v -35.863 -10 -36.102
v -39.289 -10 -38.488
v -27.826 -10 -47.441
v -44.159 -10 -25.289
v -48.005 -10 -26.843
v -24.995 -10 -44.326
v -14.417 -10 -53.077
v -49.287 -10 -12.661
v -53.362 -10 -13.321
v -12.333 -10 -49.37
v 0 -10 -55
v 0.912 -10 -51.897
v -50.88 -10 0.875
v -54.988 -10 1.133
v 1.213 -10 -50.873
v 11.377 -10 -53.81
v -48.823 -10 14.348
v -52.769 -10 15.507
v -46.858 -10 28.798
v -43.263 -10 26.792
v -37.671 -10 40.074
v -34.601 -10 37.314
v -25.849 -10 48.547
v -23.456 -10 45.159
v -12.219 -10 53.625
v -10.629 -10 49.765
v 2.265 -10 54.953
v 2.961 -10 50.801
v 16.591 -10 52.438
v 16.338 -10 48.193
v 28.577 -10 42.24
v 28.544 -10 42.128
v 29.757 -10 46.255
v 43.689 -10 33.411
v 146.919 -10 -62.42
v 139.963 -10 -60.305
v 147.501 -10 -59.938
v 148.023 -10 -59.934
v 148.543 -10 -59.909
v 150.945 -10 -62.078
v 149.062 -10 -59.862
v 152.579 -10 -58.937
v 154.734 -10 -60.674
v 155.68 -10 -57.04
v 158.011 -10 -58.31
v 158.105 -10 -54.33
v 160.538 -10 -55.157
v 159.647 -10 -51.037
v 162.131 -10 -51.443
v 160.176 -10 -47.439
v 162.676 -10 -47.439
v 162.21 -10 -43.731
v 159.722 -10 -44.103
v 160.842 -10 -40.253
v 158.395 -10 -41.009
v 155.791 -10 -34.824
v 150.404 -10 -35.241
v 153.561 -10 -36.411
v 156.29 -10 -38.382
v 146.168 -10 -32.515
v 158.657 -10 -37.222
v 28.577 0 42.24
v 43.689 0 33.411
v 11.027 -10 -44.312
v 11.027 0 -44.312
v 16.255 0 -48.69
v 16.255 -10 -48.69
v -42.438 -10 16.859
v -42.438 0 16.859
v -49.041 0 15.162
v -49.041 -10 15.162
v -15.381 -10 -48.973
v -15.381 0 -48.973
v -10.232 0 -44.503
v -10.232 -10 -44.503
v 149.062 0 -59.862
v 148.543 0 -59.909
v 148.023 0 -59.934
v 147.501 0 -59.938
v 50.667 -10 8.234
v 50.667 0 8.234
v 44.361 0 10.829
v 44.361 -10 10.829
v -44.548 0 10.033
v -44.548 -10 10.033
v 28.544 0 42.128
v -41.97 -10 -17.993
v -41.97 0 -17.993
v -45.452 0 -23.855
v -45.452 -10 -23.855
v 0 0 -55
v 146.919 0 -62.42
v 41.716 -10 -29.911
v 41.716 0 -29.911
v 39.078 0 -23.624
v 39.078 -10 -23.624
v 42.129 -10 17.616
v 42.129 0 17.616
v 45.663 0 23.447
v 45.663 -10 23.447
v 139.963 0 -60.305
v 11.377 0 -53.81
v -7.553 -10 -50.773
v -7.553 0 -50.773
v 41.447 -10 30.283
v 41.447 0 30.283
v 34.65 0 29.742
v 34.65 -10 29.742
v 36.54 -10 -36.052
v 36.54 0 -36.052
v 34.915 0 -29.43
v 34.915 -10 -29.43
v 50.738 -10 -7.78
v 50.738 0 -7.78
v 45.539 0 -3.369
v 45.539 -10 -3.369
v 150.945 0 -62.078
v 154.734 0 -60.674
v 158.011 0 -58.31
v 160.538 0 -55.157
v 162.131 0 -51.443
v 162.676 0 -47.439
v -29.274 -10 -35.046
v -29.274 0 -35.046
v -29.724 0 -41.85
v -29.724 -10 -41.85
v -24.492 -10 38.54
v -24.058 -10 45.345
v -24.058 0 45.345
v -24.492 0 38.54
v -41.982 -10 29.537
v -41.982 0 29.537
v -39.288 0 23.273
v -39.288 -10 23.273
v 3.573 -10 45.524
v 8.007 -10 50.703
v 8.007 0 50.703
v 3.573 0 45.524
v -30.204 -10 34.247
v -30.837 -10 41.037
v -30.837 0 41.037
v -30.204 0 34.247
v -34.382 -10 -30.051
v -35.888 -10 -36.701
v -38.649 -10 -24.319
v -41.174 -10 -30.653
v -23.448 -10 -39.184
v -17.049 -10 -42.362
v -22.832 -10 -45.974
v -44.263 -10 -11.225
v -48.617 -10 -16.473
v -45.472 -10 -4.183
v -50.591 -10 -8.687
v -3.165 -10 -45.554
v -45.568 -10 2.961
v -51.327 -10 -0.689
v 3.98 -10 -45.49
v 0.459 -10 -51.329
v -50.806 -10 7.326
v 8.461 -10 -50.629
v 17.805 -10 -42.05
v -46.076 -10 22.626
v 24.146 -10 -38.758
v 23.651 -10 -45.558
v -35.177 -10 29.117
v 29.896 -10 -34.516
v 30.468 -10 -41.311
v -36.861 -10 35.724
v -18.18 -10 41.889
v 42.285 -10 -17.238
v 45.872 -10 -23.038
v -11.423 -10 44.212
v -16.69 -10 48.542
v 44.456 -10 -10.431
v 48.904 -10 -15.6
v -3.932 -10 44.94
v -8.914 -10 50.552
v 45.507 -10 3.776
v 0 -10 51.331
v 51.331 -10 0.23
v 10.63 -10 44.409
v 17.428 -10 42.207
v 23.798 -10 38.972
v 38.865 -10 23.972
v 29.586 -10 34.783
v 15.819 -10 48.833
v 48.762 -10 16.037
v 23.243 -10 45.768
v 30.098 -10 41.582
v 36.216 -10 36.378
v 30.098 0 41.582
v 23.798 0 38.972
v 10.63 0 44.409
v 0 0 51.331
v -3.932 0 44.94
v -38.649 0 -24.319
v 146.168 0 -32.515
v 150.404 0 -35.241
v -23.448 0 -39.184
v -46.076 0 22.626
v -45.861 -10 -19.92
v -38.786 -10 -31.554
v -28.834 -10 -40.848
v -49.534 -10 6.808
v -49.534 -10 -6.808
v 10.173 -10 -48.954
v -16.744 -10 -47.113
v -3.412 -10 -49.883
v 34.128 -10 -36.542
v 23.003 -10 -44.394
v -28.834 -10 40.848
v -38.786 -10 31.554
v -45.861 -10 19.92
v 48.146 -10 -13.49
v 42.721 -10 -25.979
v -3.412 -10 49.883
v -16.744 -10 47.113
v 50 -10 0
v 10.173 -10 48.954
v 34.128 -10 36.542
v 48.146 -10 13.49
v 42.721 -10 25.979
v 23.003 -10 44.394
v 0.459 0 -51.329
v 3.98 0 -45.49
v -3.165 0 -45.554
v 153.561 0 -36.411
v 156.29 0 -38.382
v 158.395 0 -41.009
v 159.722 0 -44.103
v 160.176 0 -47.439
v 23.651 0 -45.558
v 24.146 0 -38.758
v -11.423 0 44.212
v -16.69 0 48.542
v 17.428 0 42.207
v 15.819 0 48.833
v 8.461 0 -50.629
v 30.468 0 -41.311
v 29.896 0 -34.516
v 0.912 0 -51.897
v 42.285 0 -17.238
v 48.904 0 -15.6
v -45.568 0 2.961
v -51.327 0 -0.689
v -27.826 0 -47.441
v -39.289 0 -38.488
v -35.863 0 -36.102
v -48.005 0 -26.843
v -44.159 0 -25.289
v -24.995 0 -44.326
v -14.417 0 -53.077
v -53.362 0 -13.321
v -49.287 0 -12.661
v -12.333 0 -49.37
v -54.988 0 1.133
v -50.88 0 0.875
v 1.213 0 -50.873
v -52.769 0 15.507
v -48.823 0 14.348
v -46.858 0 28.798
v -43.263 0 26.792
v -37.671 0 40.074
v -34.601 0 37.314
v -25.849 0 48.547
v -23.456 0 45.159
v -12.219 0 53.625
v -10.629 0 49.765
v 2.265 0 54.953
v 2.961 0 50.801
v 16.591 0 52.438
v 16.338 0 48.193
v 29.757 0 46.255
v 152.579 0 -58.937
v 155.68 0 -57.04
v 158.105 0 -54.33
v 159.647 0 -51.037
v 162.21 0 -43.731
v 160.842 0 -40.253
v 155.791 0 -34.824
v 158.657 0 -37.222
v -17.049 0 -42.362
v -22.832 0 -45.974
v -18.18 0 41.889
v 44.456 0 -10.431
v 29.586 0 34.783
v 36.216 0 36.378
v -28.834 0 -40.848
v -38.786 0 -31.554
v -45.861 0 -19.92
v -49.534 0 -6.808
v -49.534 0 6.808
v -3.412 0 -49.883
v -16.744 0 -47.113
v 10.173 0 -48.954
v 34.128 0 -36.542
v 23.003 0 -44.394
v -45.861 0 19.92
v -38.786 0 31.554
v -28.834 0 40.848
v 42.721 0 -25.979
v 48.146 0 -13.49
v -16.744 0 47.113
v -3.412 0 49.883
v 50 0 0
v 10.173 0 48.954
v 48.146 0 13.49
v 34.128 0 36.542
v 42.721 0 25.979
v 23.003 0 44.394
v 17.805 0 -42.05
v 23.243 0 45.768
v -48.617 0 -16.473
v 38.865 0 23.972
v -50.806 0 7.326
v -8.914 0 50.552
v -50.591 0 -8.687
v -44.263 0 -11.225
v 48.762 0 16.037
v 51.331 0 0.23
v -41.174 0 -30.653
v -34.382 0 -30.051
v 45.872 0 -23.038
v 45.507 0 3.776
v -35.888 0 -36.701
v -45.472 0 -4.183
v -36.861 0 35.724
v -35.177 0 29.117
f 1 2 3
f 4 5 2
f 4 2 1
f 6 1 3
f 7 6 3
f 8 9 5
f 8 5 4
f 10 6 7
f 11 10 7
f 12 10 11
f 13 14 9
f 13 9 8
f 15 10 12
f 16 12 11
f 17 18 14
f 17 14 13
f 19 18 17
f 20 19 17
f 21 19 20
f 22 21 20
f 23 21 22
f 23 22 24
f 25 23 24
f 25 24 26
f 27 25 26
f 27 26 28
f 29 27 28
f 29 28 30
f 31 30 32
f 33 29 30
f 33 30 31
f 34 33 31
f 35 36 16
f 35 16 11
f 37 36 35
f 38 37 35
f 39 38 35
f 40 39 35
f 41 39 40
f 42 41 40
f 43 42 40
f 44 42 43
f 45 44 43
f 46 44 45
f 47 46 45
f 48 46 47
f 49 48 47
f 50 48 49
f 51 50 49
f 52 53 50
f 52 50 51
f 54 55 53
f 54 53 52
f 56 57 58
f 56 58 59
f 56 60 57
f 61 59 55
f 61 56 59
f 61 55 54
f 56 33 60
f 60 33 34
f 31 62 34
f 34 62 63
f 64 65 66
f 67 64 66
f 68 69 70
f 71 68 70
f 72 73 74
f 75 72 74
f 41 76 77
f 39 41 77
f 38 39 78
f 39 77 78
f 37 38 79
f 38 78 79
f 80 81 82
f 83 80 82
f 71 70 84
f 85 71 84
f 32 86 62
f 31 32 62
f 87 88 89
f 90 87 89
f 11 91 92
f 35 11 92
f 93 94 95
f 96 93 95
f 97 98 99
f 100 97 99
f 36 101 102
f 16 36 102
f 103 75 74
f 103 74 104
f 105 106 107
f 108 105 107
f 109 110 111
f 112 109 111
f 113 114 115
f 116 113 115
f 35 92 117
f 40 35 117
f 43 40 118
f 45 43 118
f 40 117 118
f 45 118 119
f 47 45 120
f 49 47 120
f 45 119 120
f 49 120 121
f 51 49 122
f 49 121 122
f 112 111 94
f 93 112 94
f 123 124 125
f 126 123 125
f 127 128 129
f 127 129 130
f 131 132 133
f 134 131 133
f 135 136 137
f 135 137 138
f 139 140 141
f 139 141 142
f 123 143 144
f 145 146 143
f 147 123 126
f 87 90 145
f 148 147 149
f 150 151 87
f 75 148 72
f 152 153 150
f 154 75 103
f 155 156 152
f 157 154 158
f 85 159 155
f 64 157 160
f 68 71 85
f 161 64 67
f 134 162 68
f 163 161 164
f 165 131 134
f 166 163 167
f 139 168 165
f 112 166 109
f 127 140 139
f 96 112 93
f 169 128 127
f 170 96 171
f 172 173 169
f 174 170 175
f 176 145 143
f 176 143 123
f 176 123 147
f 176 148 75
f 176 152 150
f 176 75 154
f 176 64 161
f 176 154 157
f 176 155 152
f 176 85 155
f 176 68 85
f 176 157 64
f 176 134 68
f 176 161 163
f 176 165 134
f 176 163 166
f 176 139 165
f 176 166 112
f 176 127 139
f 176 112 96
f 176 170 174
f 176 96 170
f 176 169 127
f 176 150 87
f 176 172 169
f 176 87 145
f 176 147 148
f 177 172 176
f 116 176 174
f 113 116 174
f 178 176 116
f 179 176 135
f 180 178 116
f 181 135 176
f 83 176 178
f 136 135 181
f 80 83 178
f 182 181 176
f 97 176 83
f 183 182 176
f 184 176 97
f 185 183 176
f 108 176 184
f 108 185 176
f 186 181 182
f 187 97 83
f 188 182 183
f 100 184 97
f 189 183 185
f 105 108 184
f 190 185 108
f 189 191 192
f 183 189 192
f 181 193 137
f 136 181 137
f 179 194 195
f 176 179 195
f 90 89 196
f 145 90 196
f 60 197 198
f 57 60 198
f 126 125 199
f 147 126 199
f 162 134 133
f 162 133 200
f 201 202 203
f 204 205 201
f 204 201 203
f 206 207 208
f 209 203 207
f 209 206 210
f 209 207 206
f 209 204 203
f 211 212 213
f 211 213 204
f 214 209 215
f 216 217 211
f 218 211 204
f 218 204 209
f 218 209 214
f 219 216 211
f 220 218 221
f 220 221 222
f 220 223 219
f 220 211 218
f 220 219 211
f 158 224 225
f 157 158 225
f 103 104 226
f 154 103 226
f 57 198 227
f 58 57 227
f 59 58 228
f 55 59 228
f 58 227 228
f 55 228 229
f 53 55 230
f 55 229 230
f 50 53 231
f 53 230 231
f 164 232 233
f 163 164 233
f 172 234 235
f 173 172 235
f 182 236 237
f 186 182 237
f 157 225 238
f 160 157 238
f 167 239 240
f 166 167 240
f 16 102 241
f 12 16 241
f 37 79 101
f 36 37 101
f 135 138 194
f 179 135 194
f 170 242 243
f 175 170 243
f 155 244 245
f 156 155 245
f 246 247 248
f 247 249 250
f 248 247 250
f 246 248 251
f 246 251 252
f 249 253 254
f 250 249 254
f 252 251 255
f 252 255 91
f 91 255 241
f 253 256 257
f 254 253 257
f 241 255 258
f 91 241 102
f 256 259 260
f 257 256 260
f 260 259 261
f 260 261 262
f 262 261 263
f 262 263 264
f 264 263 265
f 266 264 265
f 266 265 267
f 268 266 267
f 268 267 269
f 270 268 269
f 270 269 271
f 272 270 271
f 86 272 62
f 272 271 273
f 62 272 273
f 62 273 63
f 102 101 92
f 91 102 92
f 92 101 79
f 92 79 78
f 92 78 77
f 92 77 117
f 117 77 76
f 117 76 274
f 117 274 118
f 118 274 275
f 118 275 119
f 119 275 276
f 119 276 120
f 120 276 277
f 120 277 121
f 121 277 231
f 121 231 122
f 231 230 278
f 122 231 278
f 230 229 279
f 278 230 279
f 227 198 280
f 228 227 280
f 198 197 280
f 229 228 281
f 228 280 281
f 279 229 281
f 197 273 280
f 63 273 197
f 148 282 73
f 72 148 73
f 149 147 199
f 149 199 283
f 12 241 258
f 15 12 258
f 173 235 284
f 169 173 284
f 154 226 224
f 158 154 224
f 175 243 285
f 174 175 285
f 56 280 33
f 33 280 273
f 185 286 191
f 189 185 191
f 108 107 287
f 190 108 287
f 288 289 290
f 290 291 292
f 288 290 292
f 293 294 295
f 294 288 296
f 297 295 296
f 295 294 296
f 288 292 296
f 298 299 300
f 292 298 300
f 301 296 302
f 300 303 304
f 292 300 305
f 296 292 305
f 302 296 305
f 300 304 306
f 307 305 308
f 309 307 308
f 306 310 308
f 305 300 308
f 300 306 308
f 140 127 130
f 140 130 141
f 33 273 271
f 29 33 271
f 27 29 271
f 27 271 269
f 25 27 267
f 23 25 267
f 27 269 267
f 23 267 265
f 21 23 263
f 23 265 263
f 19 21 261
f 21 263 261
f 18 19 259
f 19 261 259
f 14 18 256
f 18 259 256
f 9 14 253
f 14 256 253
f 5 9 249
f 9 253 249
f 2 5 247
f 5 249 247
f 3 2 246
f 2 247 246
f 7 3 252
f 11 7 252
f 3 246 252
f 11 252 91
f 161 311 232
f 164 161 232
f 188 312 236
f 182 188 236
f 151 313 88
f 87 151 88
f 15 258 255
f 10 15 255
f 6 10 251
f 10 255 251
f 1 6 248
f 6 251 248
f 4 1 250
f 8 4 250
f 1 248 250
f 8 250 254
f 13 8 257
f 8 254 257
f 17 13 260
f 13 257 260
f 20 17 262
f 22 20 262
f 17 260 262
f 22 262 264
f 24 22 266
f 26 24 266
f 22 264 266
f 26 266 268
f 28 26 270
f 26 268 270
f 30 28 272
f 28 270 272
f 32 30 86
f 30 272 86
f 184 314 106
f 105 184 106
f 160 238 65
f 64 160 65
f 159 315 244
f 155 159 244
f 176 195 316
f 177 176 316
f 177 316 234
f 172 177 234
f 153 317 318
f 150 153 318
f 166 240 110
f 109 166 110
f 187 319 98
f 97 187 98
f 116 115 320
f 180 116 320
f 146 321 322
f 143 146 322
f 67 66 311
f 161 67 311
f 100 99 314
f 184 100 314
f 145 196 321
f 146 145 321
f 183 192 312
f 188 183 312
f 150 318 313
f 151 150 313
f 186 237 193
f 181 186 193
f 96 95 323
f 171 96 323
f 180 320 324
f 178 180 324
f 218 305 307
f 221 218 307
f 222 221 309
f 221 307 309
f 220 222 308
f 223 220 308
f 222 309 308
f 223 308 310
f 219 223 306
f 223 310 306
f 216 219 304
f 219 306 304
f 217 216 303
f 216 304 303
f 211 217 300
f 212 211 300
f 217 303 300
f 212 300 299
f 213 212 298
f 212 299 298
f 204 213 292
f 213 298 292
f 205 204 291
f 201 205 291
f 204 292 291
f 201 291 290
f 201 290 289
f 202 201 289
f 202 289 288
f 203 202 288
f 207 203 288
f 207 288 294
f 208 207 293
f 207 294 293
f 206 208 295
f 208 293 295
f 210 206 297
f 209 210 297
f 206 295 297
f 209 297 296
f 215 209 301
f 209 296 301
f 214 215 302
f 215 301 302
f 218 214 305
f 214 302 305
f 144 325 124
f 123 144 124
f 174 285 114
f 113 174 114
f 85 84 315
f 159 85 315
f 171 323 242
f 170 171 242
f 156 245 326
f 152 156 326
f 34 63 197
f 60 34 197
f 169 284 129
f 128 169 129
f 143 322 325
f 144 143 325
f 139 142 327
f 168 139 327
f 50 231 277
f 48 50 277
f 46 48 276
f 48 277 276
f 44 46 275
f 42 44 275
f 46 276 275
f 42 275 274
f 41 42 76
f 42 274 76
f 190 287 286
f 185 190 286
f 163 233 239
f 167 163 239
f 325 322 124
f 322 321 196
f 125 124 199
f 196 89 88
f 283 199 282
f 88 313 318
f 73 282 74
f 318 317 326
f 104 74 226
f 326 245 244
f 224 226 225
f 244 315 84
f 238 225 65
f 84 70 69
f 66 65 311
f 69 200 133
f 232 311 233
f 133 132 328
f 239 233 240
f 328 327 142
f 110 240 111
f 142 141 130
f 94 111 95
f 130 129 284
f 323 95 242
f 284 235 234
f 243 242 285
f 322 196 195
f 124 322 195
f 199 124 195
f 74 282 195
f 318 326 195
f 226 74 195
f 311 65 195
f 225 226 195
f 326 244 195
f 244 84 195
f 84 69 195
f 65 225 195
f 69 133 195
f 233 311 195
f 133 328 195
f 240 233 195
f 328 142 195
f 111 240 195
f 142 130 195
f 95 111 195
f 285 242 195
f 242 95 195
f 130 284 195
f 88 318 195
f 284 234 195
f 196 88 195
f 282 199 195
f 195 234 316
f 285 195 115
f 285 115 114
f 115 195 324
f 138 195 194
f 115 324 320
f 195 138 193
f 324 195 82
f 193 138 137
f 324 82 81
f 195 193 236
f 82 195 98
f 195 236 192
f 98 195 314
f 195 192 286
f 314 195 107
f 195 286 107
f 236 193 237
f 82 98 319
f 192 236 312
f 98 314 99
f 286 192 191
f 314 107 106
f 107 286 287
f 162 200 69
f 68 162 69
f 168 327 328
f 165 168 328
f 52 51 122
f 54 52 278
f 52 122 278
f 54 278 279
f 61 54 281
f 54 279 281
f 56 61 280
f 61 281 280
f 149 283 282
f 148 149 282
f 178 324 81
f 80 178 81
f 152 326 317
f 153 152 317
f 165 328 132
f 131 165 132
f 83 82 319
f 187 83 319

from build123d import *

# Parameters (mm, degrees)
F0_R     = 50
F1_DEPTH = 10
F3_DEPTH = 10
F5_DEPTH = 10


with BuildPart() as f1:
    # F0 (on Front) → F1 (new body)
    with BuildSketch(Plane.XZ):
        Circle(F0_R)
    extrude(amount=F1_DEPTH)


with BuildPart() as f3:
    # F2 (on Front) → F3 (new body)
    with BuildSketch(Plane.XZ):
        with BuildLine():
            ThreePointArc((150.4044612389, -35.2406215734), (157.4315771407, -39.6244300326), (160.1755025209, -47.4390962451))
            ThreePointArc((160.1755025209, -47.4390962451), (156.99167071, -55.7733034822), (149.0620608774, -59.8619564602))
            ThreePointArc((149.0620608774, -59.8619564602), (148.2829455049, -59.9243280419), (147.5014551334, -59.9378844866))
            Line((147.5014551334, -59.9378844866), (139.9633135414, -60.3046370866))
            ThreePointArc((139.9633135414, -60.3046370866), (143.31101217, -61.7900970456), (146.9189057568, -62.4200028043))
            ThreePointArc((146.9189057568, -62.4200028043), (158.0111459101, -58.3099046663), (162.6755025209, -47.4390962451))
            ThreePointArc((162.6755025209, -47.4390962451), (160.8423395216, -40.2533879714), (155.7909154015, -34.8240229684))
            ThreePointArc((155.7909154015, -34.8240229684), (151.1752111055, -32.8530741752), (146.1677048631, -32.5150704403))
            Line((146.1677048631, -32.5150704403), (150.4044612389, -35.2406215734))
        make_face()
        with BuildLine():
            Line((43.6890888609, 33.4105299944), (146.1677048631, -32.5150704403))
            ThreePointArc((146.1677048631, -32.5150704403), (151.1752111055, -32.8530741752), (155.7909154015, -34.8240229684))
            Line((155.7909154015, -34.8240229684), (29.7565138957, 46.2552686813))
            ThreePointArc((29.7565138957, 46.2552686813), (37.280168576, 40.43747063), (43.6890888609, 33.4105299944))
        make_face()
        with BuildLine():
            ThreePointArc((146.9189057568, -62.4200028043), (143.31101217, -61.7900970456), (139.9633135414, -60.3046370866))
            Line((139.9633135414, -60.3046370866), (11.3767673734, -53.8104930672))
            ThreePointArc((11.3767673734, -53.8104930672), (5.7193916331, -54.7018149548), (0, -55))
            Line((0, -55), (146.9189057568, -62.4200028043))
        make_face()
        with BuildLine():
            Line((28.5765499261, 42.2400950895), (43.6890888609, 33.4105299944))
            ThreePointArc((43.6890888609, 33.4105299944), (37.280168576, 40.43747063), (29.7565138957, 46.2552686813))
            Line((29.7565138957, 46.2552686813), (28.5765499261, 42.2400950895))
        make_face()
        with BuildLine():
            ThreePointArc((0, -55), (5.7193916331, -54.7018149548), (11.3767673734, -53.8104930672))
            Line((11.3767673734, -53.8104930672), (0.9117916884, -51.897361273))
            Line((0.9117916884, -51.897361273), (0, -55))
        make_face()
        with BuildLine():
            Line((28.5765499261, 42.2400950895), (29.7565138957, 46.2552686813))
            ThreePointArc((29.7565138957, 46.2552686813), (-52.768550186, 15.5074211675), (0, -55))
            Line((0, -55), (0.9117916884, -51.897361273))
            Line((0.9117916884, -51.897361273), (1.212866517, -50.8728658376))
            ThreePointArc((1.212866517, -50.8728658376), (-48.8227308396, 14.3478387601), (28.5436473787, 42.1281345189))
            Line((28.5436473787, 42.1281345189), (28.5765499261, 42.2400950895))
        make_face()
    extrude(amount=F3_DEPTH)


with BuildPart() as f5:
    # F4 (on Front) → F5 (new body)
    with BuildSketch(Plane.XZ):
        Polygon((0, 51.3314977288), (-3.9317328197, 44.9399117696), (-8.9136210375, 50.5516569371), (-11.423403875, 44.2118342568), (-16.6901789612, 48.5423586708), (-18.1802732615, 41.8886393737), (-24.0581028646, 45.3445734972), (-24.4920259018, 38.5398639291), (-30.8370001723, 41.036594394), (-30.2041279911, 34.2474976712), (-36.8608997426, 35.7238957737), (-35.1767272699, 29.1166327555), (-41.9823154217, 29.5365511005), (-39.2880770967, 23.2728907205), (-46.0758570217, 22.6260482366), (-42.4375172321, 16.8593468324), (-49.0413003108, 15.1615804885), (-44.5479383542, 10.0330271023), (-50.8060408542, 7.325904163), (-45.5676699643, 2.9610637388), (-51.3268716242, -0.6891359474), (-45.4717454622, -4.1833968329), (-50.59104086, -8.6873035969), (-44.2625134156, -11.2254332023), (-48.6165642751, -16.4727756364), (-41.9695800589, -17.9926316619), (-45.4517839698, -23.8549364503), (-38.6490844293, -24.3193074988), (-41.1741848471, -30.6530448937), (-34.3823238862, -30.0505615359), (-35.8884975114, -36.700659469), (-29.2737636675, -35.0460726071), (-29.7241340958, -41.8497133961), (-23.4484792145, -39.1835331099), (-22.832019801, -45.9741398059), (-17.0490938873, -42.3616435241), (-15.3808977169, -48.9729582985), (-10.2322870458, -44.502592579), (-7.5531974018, -50.7727472971), (-3.1649579898, -45.5539623454), (0.4594316326, -51.3294416652), (3.9798603195, -45.49001161), (8.460812172, -50.6294115754), (11.0272377131, -44.3123061109), (16.2550424046, -48.6897962155), (17.8046297165, -42.0496802021), (23.6512922834, -45.5580841609), (24.146102043, -38.7575308885), (30.468475714, -41.310950688), (29.8963932458, -34.5164615124), (36.5396841763, -36.0523804954), (34.9147160622, -29.4303083018), (41.7162732291, -29.9111217937), (39.0782043783, -23.6235980962), (45.8715018472, -23.0375340992), (42.2849214221, -17.238499493), (48.9036354846, -15.5999069058), (44.4563555322, -10.4313420631), (50.7384368933, -7.7803393696), (45.5393423986, -3.3687888549), (51.3309837103, 0.2297181166), (45.5073667107, 3.7762440999), (50.6667683148, 8.234151299), (44.3612113454, 10.828821377), (48.7620530254, 16.0369836264), (42.1289381991, 17.6162711905), (45.6634719415, 23.4471744424), (38.8652011347, 23.9724130034), (41.4468891775, 30.2832963297), (34.6499078631, 29.7416262084), (36.2155414436, 36.3779770883), (29.5862635232, 34.782660266), (30.0975104493, 41.5819975932), (23.7982438584, 38.9720930116), (23.2425870152, 45.767945201), (17.4275598562, 42.2073524626), (15.8186036689, 48.8333332576), (10.6301881676, 44.4092281397), (8.0073255173, 50.7031103301), (3.5725522519, 45.5238104167), align=None)
    extrude(amount=F5_DEPTH)


solid = Compound([f1.part, f3.part, f5.part])
